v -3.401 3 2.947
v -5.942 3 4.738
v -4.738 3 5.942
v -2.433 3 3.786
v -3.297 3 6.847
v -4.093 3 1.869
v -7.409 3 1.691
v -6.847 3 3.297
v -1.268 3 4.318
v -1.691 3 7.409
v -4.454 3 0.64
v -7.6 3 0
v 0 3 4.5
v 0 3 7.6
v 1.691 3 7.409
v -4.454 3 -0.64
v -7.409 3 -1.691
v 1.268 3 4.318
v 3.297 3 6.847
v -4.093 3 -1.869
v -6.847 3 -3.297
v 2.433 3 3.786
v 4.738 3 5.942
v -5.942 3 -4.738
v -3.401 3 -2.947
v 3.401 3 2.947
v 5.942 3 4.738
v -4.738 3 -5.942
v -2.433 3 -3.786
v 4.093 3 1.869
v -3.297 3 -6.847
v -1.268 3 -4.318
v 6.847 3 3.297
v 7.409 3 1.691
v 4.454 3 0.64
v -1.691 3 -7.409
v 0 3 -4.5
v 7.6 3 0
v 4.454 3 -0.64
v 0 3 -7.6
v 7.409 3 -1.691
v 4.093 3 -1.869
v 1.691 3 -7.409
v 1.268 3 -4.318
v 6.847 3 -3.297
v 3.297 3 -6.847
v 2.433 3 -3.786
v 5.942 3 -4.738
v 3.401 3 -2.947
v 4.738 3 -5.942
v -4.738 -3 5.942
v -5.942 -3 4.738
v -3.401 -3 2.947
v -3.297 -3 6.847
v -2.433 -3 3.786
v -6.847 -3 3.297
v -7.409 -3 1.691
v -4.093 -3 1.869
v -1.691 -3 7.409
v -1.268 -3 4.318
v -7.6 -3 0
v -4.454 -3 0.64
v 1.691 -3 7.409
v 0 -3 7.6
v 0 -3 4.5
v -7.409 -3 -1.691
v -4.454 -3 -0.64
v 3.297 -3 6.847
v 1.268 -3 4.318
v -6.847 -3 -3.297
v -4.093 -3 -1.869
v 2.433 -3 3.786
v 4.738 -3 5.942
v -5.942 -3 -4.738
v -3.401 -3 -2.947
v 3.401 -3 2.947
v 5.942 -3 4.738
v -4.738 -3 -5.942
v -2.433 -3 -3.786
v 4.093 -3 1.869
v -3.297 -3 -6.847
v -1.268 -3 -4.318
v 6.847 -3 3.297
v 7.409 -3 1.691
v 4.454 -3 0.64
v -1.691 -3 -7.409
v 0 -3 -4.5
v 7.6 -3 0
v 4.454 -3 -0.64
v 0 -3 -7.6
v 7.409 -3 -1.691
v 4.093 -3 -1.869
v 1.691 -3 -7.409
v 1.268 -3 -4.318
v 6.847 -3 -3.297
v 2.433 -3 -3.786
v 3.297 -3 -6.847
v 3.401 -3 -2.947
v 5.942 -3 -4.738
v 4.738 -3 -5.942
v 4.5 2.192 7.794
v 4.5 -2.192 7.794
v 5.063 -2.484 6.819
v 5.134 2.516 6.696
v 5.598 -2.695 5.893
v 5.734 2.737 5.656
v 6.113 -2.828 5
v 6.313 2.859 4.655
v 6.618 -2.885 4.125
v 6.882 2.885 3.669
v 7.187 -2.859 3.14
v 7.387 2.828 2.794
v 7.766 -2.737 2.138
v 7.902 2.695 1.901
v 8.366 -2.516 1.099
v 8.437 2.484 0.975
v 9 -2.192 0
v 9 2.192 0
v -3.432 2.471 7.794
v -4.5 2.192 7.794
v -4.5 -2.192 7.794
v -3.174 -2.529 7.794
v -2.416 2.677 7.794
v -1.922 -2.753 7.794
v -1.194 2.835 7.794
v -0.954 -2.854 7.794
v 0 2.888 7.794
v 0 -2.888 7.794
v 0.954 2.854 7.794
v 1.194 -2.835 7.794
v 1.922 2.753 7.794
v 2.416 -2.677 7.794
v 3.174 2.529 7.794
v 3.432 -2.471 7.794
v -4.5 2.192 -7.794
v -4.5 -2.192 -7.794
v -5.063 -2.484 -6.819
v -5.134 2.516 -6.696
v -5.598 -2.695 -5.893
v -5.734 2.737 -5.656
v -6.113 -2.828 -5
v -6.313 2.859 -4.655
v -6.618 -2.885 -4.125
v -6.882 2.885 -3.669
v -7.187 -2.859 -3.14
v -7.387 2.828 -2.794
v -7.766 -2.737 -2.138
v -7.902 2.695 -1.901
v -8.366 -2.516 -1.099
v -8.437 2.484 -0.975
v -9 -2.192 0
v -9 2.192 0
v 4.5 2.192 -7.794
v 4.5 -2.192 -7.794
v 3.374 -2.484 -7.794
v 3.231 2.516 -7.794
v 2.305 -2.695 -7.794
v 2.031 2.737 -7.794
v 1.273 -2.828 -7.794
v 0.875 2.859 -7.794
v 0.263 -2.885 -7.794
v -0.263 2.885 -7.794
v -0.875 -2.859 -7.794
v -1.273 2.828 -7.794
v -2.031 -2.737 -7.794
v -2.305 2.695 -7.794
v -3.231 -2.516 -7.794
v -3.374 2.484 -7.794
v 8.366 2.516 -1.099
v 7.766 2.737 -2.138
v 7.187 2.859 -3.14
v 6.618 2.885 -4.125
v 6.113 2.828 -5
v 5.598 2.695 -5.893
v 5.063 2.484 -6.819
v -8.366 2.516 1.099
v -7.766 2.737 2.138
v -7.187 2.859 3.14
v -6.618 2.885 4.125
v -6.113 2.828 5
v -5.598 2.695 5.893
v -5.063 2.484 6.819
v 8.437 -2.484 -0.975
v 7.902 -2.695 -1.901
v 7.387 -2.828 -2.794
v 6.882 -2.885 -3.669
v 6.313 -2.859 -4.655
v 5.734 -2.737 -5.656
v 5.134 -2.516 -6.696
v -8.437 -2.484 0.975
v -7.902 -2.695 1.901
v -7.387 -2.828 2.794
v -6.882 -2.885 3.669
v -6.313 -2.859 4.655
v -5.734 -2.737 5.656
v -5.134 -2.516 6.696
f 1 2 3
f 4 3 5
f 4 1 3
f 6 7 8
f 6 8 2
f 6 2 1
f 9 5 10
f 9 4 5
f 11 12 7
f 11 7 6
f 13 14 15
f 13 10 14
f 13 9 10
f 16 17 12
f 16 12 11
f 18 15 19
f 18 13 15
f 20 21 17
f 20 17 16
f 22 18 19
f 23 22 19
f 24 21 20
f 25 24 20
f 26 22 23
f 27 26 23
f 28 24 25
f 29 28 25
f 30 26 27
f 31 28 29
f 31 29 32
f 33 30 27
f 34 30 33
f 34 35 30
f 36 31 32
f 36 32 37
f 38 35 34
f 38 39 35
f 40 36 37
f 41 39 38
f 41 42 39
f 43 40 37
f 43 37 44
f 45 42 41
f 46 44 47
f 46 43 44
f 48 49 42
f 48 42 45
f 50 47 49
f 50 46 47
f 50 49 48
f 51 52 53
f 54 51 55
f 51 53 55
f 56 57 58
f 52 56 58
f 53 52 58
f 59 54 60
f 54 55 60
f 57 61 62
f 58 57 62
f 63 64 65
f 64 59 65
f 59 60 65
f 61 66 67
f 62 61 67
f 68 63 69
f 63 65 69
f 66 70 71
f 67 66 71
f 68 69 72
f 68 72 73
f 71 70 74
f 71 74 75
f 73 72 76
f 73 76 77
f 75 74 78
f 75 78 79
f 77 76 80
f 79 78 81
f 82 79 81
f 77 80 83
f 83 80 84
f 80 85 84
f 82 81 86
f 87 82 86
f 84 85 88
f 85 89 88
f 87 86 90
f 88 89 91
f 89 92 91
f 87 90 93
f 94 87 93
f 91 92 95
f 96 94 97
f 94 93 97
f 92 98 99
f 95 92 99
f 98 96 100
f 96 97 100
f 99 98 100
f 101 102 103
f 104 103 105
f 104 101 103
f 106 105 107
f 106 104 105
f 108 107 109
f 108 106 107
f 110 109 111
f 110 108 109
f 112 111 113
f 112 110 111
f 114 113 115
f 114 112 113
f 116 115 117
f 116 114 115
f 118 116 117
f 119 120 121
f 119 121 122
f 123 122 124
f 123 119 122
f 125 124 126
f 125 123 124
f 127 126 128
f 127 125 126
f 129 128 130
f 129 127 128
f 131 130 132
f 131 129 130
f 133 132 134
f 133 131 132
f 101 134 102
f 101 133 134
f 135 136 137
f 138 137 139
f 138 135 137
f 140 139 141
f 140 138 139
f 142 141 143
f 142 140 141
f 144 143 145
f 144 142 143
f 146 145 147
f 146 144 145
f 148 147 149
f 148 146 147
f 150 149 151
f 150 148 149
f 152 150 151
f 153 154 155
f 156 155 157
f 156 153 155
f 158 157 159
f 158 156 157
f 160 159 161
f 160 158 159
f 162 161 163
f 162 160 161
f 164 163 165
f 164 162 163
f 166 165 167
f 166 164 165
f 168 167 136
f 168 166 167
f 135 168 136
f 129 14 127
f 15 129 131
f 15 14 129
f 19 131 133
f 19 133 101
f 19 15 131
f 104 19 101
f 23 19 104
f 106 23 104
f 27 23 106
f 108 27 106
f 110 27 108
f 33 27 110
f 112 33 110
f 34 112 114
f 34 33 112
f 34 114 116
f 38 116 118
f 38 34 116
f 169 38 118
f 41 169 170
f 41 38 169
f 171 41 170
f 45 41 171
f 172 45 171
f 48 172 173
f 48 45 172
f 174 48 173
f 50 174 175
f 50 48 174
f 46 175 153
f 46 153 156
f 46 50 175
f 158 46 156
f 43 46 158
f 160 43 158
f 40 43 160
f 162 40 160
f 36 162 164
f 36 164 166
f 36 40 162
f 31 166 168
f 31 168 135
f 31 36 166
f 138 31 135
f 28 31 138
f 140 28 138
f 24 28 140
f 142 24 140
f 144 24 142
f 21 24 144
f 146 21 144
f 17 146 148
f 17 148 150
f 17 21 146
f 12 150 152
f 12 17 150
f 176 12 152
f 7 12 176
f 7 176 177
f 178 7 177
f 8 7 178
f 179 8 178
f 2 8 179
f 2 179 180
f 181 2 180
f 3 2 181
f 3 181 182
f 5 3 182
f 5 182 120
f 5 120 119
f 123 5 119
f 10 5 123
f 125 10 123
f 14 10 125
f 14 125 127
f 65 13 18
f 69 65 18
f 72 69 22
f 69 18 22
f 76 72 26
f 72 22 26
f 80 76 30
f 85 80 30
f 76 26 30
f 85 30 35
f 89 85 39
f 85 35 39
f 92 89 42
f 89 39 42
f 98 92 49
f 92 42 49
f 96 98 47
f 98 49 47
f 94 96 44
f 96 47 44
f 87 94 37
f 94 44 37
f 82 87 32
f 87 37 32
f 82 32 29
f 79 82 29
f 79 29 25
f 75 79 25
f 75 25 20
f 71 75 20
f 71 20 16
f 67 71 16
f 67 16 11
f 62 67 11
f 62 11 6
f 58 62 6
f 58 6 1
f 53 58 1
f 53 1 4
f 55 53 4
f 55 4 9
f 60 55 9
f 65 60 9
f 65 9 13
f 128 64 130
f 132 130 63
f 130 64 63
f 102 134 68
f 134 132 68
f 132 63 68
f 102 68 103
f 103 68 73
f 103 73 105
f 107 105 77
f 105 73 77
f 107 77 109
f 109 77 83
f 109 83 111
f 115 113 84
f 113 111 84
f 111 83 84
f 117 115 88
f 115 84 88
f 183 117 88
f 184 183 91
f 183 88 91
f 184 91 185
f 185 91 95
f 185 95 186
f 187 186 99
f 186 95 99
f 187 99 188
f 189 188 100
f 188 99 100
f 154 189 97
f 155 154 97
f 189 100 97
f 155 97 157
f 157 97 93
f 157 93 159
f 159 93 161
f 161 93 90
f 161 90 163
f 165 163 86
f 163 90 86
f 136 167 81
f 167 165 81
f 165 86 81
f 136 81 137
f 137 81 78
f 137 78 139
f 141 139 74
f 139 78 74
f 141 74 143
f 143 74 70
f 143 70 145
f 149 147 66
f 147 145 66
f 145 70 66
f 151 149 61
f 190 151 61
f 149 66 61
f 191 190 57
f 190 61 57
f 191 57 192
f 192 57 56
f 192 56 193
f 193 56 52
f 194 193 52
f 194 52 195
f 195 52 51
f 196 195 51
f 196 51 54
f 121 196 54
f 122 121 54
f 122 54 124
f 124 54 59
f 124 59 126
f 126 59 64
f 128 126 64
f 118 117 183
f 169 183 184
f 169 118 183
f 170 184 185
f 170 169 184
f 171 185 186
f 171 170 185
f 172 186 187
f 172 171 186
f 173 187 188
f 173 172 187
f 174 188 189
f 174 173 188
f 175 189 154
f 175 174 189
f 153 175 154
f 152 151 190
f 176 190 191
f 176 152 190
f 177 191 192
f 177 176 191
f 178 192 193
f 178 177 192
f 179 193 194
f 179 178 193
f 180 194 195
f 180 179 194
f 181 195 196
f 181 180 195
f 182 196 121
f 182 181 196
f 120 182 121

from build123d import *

# Parameters (mm, degrees)
BOSS_EXTRUDE1_DEPTH = 3
SKETCH3_R           = 4.5
CUT_EXTRUDE1_DEPTH  = 7


with BuildPart() as part:
    # Sketch2 → Boss-Extrude1 (new body, symmetric)
    with BuildSketch(Plane(origin=(0, 0, 0), x_dir=(1, 0, 0), z_dir=(0, 1, 0))):
        Polygon((-4.5, 7.794228634), (-9, 0), (-4.5, -7.794228634), (4.5, -7.794228634), (9, 0), (4.5, 7.794228634), align=None)
    extrude(amount=BOSS_EXTRUDE1_DEPTH, both=True)

    # Sketch3 → Cut-Extrude1 (cut, through all)
    with BuildSketch(Plane(origin=(0, 3, 0), x_dir=(1, 0, 0), z_dir=(0, 1, 0))):
        with Locations(Location((0, 0, 0), (0, 0, 270))):  # turned: the seam where the file's is
            Circle(SKETCH3_R)
    extrude(amount=-CUT_EXTRUDE1_DEPTH, mode=Mode.SUBTRACT)

    # Sketch10 → Cut-Revolve1 (revolve, cut)
    with BuildSketch(Plane.XY, mode=Mode.PRIVATE) as cut_revolve1_sk:
        Polygon((-9, 3), (-9, 2.191556781), (-7.599735269, 3), align=None)
    cut_revolve1 = revolve(cut_revolve1_sk.sketch.rotate(Axis((0, 0, 0), (0, 1, 0)), 90), axis=Axis((0, 0, 0), (0, 1, 0)), mode=Mode.SUBTRACT)  # turned: the seam where the file's is

    # Mirror1: Cut-Revolve1 across plane
    add(cut_revolve1.mirror(Plane.ZX), mode=Mode.SUBTRACT)


solid = part.part
